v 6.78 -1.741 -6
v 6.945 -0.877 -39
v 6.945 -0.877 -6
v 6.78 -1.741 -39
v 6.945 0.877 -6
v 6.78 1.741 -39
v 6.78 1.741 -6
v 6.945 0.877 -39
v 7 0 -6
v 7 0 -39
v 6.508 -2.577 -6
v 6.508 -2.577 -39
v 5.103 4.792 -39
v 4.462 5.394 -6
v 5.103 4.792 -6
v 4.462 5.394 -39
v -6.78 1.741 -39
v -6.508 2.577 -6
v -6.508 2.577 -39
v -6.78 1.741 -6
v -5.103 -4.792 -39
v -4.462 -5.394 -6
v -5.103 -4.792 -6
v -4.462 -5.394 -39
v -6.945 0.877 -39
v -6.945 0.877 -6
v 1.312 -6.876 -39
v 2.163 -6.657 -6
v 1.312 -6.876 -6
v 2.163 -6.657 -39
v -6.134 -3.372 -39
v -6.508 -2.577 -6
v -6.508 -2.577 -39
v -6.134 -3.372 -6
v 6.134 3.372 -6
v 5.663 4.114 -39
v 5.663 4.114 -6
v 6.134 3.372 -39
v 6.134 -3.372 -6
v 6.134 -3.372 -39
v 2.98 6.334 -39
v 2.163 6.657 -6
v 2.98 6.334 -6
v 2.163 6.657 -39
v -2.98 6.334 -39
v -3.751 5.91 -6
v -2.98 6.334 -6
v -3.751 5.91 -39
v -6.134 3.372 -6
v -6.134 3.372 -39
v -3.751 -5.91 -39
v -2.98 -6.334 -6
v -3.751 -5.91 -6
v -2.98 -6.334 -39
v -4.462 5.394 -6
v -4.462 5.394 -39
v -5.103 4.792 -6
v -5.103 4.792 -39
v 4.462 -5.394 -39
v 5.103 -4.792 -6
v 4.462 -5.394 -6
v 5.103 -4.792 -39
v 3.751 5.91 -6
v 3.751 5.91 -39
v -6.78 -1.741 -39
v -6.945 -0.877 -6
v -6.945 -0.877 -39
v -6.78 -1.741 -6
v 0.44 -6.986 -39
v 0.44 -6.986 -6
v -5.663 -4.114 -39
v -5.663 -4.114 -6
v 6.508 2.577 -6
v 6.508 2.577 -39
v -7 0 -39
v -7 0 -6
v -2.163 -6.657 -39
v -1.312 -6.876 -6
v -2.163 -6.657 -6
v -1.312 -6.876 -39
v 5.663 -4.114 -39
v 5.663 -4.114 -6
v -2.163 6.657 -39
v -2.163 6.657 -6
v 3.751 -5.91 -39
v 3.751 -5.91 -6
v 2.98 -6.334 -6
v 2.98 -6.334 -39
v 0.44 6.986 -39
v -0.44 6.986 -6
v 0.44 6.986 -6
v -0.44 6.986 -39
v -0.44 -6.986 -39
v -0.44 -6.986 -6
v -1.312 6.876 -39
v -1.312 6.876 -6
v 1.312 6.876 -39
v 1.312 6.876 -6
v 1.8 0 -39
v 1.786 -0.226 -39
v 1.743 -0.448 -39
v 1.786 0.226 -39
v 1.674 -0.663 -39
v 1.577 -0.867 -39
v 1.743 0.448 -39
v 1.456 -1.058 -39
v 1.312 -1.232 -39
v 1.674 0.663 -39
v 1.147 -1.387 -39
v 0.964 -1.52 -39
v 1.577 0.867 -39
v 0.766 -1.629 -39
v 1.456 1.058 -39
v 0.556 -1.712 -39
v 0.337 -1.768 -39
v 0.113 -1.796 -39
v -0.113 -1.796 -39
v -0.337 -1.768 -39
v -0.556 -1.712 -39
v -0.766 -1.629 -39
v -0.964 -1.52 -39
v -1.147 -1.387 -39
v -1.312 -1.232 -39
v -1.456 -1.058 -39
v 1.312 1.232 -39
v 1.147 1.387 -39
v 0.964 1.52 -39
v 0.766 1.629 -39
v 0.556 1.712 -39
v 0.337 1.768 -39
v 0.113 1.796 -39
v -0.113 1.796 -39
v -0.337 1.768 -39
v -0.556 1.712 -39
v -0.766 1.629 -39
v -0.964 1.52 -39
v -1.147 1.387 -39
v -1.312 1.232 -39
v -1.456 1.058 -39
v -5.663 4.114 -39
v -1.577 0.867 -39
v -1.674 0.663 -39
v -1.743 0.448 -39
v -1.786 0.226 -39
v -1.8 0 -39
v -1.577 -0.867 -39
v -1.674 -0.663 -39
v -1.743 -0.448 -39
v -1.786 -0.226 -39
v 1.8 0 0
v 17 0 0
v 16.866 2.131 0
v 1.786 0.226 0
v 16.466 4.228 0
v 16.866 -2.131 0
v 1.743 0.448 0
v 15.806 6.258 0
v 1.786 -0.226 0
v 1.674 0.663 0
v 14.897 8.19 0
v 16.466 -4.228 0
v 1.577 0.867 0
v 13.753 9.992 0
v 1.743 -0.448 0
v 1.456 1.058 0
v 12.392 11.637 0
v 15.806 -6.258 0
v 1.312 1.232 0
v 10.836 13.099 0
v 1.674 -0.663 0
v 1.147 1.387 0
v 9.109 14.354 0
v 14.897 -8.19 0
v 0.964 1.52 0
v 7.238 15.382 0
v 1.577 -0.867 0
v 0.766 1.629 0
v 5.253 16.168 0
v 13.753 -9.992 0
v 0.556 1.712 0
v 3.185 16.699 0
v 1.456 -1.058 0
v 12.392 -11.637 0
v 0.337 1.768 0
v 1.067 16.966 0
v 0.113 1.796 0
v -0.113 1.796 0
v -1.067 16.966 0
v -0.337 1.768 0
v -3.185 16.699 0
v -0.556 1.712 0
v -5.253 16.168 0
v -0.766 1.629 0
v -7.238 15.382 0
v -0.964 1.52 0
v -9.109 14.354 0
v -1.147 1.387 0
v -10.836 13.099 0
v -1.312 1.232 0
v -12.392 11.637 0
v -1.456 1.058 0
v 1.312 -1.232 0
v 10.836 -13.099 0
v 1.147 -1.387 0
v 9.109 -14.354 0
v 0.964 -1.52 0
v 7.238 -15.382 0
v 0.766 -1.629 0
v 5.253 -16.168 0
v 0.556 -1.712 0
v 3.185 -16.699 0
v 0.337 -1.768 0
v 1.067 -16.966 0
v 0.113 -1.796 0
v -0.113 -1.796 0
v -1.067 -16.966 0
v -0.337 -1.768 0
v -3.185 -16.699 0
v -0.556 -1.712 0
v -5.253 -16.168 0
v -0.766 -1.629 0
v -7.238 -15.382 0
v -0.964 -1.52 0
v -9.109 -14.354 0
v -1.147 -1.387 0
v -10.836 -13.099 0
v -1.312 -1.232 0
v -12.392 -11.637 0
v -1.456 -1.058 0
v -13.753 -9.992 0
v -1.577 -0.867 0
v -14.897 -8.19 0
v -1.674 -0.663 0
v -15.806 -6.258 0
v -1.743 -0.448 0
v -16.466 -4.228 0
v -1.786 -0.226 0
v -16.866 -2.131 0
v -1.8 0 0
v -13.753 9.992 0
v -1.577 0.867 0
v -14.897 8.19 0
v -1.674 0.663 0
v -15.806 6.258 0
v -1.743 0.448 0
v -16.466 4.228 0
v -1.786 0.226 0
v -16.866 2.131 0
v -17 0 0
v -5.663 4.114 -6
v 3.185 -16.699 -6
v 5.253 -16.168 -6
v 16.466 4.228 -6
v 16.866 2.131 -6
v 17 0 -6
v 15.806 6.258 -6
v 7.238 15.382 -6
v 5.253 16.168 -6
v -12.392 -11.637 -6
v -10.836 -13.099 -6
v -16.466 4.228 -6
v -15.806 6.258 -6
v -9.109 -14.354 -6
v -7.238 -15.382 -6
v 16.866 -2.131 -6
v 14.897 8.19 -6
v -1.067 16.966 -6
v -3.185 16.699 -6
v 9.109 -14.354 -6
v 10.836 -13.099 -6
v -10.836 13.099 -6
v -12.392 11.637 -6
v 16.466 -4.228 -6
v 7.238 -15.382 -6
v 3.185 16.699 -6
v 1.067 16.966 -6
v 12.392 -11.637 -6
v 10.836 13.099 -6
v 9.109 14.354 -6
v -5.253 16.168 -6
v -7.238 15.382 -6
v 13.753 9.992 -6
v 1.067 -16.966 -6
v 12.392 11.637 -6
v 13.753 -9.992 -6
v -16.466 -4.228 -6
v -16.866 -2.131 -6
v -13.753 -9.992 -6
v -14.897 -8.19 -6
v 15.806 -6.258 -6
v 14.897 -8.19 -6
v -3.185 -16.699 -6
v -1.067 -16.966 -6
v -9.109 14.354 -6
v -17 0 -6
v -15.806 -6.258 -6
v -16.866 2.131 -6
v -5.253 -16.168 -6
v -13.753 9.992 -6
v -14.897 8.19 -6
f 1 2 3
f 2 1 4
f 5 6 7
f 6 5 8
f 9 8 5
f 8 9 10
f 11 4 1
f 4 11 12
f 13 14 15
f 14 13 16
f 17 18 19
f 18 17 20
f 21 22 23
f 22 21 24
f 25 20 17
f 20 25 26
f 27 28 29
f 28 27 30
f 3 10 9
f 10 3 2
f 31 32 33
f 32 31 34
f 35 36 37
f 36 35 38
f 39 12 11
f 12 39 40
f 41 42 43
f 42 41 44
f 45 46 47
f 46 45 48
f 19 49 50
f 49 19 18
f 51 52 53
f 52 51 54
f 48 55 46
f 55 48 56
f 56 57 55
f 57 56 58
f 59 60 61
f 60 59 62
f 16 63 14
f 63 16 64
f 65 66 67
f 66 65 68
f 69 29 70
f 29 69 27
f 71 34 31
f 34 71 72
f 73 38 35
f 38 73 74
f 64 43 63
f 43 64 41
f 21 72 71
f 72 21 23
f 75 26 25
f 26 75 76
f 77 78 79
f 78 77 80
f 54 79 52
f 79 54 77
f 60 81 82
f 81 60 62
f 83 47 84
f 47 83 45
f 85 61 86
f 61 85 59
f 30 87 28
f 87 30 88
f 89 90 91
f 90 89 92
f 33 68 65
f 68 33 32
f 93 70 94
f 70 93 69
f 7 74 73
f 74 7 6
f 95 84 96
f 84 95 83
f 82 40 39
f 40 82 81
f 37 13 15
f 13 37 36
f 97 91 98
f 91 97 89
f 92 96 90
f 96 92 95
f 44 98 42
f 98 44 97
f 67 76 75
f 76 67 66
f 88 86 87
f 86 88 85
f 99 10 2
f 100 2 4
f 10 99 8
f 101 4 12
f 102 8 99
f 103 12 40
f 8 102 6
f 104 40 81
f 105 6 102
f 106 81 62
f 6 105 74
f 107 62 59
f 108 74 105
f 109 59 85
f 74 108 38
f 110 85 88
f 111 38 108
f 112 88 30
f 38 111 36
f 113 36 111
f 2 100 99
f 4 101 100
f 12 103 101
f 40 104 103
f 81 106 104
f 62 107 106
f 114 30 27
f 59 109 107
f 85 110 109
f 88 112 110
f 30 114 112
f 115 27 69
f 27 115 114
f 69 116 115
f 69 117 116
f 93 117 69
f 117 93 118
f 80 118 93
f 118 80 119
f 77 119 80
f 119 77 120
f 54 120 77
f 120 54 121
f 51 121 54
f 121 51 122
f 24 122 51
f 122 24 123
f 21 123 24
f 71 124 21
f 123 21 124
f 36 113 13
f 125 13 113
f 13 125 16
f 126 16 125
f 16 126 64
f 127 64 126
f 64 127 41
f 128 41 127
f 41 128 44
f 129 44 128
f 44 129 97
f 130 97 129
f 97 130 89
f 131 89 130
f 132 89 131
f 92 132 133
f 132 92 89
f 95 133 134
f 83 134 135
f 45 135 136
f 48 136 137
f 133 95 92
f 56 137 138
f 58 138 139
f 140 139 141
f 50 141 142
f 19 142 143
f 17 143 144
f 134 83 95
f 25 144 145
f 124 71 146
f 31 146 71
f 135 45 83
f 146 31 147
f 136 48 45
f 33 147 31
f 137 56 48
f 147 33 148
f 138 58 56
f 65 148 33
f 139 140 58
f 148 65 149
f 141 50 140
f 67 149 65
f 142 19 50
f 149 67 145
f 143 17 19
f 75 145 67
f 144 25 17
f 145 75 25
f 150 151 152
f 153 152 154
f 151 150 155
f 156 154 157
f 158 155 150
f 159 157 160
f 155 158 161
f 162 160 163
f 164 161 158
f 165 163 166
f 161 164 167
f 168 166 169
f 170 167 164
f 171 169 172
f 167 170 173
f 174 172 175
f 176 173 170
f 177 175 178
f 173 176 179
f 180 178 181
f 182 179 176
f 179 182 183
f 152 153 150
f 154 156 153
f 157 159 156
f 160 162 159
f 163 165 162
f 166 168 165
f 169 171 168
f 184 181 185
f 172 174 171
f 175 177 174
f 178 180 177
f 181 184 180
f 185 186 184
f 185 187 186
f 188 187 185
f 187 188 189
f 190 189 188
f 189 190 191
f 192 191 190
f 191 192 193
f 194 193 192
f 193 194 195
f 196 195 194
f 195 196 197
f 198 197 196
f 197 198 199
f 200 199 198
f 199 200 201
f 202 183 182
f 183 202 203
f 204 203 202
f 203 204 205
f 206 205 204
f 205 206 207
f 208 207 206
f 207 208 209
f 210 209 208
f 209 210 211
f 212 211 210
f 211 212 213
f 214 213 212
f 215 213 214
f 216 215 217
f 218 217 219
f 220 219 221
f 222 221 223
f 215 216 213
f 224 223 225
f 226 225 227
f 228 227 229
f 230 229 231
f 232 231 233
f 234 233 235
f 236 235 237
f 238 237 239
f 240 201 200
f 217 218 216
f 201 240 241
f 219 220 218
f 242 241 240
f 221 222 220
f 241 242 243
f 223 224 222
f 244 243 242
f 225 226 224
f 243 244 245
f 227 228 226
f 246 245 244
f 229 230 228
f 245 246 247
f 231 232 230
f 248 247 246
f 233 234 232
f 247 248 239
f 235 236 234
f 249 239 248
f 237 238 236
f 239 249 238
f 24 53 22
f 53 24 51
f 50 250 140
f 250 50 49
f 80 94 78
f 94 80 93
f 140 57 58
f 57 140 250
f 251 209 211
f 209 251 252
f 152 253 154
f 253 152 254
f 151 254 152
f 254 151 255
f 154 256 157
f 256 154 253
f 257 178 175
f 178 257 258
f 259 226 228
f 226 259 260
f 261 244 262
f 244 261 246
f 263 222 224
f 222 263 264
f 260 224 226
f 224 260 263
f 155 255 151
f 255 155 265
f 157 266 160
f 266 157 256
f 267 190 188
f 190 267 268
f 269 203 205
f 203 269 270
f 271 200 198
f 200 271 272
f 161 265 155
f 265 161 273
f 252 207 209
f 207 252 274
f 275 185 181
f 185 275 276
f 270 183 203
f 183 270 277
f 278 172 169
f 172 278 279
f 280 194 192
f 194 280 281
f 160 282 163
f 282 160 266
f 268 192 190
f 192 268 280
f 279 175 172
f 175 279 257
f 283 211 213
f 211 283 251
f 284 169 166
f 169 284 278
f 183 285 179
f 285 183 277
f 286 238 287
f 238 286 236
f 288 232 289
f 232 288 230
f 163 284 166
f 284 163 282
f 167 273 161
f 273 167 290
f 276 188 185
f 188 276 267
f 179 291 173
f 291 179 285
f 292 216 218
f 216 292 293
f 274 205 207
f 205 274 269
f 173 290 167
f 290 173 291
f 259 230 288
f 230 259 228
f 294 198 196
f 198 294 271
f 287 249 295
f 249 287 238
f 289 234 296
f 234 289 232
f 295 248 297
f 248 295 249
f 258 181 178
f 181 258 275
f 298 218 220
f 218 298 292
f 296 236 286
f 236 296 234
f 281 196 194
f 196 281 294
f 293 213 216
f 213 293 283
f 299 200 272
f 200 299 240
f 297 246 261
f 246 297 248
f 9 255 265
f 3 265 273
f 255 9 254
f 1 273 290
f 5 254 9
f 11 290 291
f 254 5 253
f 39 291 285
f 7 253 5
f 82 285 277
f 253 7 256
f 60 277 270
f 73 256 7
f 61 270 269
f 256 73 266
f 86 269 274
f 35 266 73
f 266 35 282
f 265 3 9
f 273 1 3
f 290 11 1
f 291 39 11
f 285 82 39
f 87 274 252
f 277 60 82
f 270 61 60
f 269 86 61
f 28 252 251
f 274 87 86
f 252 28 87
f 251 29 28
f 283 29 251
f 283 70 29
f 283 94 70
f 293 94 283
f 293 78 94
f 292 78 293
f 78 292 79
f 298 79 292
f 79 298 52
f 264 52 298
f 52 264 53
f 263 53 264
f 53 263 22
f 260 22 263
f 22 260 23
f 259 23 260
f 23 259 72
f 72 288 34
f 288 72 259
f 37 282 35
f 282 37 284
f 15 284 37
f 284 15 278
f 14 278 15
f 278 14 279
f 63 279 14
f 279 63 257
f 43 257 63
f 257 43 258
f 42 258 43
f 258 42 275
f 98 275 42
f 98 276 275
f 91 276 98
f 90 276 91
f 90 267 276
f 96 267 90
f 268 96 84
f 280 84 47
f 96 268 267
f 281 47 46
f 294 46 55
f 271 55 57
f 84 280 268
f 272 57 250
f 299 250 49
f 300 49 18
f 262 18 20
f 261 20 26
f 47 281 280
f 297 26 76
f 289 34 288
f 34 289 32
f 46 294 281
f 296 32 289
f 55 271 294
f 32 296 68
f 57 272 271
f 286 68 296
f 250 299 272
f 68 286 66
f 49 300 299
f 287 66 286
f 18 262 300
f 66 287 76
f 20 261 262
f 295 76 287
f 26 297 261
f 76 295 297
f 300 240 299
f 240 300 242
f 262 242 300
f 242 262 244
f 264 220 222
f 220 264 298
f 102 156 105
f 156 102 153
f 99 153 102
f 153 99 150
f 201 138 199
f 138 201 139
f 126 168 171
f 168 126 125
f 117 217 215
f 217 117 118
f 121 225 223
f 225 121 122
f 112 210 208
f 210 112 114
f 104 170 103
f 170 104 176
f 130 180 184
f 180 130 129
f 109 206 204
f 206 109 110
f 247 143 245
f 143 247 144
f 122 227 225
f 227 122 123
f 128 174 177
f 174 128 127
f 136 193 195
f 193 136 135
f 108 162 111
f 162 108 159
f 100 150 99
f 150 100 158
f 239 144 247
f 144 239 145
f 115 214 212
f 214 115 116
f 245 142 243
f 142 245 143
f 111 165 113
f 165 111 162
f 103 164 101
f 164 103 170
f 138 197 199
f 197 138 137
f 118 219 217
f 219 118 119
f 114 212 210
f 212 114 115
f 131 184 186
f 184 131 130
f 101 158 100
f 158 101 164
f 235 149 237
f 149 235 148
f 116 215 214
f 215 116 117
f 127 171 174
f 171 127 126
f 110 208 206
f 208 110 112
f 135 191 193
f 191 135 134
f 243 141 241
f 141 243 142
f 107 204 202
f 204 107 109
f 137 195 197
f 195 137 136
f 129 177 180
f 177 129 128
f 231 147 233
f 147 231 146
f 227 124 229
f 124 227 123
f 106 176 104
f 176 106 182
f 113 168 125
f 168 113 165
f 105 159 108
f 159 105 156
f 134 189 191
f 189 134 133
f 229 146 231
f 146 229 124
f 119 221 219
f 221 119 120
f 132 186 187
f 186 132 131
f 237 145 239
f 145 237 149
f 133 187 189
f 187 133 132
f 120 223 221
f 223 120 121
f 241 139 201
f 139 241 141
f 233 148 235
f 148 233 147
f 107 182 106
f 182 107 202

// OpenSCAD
$fn = 50;


difference() {
	union() {
		translate(v = [0, 0, -39.0000000000]) {
			cylinder(h = 39, r = 7.0000000000);
		}
		translate(v = [0, 0, -6.0000000000]) {
			cylinder(h = 6, r = 17.0000000000);
		}
	}
	union() {
		#translate(v = [0, 0, -39]) {
			cylinder(h = 39, r = 1.8000000000);
		}
	}
}
